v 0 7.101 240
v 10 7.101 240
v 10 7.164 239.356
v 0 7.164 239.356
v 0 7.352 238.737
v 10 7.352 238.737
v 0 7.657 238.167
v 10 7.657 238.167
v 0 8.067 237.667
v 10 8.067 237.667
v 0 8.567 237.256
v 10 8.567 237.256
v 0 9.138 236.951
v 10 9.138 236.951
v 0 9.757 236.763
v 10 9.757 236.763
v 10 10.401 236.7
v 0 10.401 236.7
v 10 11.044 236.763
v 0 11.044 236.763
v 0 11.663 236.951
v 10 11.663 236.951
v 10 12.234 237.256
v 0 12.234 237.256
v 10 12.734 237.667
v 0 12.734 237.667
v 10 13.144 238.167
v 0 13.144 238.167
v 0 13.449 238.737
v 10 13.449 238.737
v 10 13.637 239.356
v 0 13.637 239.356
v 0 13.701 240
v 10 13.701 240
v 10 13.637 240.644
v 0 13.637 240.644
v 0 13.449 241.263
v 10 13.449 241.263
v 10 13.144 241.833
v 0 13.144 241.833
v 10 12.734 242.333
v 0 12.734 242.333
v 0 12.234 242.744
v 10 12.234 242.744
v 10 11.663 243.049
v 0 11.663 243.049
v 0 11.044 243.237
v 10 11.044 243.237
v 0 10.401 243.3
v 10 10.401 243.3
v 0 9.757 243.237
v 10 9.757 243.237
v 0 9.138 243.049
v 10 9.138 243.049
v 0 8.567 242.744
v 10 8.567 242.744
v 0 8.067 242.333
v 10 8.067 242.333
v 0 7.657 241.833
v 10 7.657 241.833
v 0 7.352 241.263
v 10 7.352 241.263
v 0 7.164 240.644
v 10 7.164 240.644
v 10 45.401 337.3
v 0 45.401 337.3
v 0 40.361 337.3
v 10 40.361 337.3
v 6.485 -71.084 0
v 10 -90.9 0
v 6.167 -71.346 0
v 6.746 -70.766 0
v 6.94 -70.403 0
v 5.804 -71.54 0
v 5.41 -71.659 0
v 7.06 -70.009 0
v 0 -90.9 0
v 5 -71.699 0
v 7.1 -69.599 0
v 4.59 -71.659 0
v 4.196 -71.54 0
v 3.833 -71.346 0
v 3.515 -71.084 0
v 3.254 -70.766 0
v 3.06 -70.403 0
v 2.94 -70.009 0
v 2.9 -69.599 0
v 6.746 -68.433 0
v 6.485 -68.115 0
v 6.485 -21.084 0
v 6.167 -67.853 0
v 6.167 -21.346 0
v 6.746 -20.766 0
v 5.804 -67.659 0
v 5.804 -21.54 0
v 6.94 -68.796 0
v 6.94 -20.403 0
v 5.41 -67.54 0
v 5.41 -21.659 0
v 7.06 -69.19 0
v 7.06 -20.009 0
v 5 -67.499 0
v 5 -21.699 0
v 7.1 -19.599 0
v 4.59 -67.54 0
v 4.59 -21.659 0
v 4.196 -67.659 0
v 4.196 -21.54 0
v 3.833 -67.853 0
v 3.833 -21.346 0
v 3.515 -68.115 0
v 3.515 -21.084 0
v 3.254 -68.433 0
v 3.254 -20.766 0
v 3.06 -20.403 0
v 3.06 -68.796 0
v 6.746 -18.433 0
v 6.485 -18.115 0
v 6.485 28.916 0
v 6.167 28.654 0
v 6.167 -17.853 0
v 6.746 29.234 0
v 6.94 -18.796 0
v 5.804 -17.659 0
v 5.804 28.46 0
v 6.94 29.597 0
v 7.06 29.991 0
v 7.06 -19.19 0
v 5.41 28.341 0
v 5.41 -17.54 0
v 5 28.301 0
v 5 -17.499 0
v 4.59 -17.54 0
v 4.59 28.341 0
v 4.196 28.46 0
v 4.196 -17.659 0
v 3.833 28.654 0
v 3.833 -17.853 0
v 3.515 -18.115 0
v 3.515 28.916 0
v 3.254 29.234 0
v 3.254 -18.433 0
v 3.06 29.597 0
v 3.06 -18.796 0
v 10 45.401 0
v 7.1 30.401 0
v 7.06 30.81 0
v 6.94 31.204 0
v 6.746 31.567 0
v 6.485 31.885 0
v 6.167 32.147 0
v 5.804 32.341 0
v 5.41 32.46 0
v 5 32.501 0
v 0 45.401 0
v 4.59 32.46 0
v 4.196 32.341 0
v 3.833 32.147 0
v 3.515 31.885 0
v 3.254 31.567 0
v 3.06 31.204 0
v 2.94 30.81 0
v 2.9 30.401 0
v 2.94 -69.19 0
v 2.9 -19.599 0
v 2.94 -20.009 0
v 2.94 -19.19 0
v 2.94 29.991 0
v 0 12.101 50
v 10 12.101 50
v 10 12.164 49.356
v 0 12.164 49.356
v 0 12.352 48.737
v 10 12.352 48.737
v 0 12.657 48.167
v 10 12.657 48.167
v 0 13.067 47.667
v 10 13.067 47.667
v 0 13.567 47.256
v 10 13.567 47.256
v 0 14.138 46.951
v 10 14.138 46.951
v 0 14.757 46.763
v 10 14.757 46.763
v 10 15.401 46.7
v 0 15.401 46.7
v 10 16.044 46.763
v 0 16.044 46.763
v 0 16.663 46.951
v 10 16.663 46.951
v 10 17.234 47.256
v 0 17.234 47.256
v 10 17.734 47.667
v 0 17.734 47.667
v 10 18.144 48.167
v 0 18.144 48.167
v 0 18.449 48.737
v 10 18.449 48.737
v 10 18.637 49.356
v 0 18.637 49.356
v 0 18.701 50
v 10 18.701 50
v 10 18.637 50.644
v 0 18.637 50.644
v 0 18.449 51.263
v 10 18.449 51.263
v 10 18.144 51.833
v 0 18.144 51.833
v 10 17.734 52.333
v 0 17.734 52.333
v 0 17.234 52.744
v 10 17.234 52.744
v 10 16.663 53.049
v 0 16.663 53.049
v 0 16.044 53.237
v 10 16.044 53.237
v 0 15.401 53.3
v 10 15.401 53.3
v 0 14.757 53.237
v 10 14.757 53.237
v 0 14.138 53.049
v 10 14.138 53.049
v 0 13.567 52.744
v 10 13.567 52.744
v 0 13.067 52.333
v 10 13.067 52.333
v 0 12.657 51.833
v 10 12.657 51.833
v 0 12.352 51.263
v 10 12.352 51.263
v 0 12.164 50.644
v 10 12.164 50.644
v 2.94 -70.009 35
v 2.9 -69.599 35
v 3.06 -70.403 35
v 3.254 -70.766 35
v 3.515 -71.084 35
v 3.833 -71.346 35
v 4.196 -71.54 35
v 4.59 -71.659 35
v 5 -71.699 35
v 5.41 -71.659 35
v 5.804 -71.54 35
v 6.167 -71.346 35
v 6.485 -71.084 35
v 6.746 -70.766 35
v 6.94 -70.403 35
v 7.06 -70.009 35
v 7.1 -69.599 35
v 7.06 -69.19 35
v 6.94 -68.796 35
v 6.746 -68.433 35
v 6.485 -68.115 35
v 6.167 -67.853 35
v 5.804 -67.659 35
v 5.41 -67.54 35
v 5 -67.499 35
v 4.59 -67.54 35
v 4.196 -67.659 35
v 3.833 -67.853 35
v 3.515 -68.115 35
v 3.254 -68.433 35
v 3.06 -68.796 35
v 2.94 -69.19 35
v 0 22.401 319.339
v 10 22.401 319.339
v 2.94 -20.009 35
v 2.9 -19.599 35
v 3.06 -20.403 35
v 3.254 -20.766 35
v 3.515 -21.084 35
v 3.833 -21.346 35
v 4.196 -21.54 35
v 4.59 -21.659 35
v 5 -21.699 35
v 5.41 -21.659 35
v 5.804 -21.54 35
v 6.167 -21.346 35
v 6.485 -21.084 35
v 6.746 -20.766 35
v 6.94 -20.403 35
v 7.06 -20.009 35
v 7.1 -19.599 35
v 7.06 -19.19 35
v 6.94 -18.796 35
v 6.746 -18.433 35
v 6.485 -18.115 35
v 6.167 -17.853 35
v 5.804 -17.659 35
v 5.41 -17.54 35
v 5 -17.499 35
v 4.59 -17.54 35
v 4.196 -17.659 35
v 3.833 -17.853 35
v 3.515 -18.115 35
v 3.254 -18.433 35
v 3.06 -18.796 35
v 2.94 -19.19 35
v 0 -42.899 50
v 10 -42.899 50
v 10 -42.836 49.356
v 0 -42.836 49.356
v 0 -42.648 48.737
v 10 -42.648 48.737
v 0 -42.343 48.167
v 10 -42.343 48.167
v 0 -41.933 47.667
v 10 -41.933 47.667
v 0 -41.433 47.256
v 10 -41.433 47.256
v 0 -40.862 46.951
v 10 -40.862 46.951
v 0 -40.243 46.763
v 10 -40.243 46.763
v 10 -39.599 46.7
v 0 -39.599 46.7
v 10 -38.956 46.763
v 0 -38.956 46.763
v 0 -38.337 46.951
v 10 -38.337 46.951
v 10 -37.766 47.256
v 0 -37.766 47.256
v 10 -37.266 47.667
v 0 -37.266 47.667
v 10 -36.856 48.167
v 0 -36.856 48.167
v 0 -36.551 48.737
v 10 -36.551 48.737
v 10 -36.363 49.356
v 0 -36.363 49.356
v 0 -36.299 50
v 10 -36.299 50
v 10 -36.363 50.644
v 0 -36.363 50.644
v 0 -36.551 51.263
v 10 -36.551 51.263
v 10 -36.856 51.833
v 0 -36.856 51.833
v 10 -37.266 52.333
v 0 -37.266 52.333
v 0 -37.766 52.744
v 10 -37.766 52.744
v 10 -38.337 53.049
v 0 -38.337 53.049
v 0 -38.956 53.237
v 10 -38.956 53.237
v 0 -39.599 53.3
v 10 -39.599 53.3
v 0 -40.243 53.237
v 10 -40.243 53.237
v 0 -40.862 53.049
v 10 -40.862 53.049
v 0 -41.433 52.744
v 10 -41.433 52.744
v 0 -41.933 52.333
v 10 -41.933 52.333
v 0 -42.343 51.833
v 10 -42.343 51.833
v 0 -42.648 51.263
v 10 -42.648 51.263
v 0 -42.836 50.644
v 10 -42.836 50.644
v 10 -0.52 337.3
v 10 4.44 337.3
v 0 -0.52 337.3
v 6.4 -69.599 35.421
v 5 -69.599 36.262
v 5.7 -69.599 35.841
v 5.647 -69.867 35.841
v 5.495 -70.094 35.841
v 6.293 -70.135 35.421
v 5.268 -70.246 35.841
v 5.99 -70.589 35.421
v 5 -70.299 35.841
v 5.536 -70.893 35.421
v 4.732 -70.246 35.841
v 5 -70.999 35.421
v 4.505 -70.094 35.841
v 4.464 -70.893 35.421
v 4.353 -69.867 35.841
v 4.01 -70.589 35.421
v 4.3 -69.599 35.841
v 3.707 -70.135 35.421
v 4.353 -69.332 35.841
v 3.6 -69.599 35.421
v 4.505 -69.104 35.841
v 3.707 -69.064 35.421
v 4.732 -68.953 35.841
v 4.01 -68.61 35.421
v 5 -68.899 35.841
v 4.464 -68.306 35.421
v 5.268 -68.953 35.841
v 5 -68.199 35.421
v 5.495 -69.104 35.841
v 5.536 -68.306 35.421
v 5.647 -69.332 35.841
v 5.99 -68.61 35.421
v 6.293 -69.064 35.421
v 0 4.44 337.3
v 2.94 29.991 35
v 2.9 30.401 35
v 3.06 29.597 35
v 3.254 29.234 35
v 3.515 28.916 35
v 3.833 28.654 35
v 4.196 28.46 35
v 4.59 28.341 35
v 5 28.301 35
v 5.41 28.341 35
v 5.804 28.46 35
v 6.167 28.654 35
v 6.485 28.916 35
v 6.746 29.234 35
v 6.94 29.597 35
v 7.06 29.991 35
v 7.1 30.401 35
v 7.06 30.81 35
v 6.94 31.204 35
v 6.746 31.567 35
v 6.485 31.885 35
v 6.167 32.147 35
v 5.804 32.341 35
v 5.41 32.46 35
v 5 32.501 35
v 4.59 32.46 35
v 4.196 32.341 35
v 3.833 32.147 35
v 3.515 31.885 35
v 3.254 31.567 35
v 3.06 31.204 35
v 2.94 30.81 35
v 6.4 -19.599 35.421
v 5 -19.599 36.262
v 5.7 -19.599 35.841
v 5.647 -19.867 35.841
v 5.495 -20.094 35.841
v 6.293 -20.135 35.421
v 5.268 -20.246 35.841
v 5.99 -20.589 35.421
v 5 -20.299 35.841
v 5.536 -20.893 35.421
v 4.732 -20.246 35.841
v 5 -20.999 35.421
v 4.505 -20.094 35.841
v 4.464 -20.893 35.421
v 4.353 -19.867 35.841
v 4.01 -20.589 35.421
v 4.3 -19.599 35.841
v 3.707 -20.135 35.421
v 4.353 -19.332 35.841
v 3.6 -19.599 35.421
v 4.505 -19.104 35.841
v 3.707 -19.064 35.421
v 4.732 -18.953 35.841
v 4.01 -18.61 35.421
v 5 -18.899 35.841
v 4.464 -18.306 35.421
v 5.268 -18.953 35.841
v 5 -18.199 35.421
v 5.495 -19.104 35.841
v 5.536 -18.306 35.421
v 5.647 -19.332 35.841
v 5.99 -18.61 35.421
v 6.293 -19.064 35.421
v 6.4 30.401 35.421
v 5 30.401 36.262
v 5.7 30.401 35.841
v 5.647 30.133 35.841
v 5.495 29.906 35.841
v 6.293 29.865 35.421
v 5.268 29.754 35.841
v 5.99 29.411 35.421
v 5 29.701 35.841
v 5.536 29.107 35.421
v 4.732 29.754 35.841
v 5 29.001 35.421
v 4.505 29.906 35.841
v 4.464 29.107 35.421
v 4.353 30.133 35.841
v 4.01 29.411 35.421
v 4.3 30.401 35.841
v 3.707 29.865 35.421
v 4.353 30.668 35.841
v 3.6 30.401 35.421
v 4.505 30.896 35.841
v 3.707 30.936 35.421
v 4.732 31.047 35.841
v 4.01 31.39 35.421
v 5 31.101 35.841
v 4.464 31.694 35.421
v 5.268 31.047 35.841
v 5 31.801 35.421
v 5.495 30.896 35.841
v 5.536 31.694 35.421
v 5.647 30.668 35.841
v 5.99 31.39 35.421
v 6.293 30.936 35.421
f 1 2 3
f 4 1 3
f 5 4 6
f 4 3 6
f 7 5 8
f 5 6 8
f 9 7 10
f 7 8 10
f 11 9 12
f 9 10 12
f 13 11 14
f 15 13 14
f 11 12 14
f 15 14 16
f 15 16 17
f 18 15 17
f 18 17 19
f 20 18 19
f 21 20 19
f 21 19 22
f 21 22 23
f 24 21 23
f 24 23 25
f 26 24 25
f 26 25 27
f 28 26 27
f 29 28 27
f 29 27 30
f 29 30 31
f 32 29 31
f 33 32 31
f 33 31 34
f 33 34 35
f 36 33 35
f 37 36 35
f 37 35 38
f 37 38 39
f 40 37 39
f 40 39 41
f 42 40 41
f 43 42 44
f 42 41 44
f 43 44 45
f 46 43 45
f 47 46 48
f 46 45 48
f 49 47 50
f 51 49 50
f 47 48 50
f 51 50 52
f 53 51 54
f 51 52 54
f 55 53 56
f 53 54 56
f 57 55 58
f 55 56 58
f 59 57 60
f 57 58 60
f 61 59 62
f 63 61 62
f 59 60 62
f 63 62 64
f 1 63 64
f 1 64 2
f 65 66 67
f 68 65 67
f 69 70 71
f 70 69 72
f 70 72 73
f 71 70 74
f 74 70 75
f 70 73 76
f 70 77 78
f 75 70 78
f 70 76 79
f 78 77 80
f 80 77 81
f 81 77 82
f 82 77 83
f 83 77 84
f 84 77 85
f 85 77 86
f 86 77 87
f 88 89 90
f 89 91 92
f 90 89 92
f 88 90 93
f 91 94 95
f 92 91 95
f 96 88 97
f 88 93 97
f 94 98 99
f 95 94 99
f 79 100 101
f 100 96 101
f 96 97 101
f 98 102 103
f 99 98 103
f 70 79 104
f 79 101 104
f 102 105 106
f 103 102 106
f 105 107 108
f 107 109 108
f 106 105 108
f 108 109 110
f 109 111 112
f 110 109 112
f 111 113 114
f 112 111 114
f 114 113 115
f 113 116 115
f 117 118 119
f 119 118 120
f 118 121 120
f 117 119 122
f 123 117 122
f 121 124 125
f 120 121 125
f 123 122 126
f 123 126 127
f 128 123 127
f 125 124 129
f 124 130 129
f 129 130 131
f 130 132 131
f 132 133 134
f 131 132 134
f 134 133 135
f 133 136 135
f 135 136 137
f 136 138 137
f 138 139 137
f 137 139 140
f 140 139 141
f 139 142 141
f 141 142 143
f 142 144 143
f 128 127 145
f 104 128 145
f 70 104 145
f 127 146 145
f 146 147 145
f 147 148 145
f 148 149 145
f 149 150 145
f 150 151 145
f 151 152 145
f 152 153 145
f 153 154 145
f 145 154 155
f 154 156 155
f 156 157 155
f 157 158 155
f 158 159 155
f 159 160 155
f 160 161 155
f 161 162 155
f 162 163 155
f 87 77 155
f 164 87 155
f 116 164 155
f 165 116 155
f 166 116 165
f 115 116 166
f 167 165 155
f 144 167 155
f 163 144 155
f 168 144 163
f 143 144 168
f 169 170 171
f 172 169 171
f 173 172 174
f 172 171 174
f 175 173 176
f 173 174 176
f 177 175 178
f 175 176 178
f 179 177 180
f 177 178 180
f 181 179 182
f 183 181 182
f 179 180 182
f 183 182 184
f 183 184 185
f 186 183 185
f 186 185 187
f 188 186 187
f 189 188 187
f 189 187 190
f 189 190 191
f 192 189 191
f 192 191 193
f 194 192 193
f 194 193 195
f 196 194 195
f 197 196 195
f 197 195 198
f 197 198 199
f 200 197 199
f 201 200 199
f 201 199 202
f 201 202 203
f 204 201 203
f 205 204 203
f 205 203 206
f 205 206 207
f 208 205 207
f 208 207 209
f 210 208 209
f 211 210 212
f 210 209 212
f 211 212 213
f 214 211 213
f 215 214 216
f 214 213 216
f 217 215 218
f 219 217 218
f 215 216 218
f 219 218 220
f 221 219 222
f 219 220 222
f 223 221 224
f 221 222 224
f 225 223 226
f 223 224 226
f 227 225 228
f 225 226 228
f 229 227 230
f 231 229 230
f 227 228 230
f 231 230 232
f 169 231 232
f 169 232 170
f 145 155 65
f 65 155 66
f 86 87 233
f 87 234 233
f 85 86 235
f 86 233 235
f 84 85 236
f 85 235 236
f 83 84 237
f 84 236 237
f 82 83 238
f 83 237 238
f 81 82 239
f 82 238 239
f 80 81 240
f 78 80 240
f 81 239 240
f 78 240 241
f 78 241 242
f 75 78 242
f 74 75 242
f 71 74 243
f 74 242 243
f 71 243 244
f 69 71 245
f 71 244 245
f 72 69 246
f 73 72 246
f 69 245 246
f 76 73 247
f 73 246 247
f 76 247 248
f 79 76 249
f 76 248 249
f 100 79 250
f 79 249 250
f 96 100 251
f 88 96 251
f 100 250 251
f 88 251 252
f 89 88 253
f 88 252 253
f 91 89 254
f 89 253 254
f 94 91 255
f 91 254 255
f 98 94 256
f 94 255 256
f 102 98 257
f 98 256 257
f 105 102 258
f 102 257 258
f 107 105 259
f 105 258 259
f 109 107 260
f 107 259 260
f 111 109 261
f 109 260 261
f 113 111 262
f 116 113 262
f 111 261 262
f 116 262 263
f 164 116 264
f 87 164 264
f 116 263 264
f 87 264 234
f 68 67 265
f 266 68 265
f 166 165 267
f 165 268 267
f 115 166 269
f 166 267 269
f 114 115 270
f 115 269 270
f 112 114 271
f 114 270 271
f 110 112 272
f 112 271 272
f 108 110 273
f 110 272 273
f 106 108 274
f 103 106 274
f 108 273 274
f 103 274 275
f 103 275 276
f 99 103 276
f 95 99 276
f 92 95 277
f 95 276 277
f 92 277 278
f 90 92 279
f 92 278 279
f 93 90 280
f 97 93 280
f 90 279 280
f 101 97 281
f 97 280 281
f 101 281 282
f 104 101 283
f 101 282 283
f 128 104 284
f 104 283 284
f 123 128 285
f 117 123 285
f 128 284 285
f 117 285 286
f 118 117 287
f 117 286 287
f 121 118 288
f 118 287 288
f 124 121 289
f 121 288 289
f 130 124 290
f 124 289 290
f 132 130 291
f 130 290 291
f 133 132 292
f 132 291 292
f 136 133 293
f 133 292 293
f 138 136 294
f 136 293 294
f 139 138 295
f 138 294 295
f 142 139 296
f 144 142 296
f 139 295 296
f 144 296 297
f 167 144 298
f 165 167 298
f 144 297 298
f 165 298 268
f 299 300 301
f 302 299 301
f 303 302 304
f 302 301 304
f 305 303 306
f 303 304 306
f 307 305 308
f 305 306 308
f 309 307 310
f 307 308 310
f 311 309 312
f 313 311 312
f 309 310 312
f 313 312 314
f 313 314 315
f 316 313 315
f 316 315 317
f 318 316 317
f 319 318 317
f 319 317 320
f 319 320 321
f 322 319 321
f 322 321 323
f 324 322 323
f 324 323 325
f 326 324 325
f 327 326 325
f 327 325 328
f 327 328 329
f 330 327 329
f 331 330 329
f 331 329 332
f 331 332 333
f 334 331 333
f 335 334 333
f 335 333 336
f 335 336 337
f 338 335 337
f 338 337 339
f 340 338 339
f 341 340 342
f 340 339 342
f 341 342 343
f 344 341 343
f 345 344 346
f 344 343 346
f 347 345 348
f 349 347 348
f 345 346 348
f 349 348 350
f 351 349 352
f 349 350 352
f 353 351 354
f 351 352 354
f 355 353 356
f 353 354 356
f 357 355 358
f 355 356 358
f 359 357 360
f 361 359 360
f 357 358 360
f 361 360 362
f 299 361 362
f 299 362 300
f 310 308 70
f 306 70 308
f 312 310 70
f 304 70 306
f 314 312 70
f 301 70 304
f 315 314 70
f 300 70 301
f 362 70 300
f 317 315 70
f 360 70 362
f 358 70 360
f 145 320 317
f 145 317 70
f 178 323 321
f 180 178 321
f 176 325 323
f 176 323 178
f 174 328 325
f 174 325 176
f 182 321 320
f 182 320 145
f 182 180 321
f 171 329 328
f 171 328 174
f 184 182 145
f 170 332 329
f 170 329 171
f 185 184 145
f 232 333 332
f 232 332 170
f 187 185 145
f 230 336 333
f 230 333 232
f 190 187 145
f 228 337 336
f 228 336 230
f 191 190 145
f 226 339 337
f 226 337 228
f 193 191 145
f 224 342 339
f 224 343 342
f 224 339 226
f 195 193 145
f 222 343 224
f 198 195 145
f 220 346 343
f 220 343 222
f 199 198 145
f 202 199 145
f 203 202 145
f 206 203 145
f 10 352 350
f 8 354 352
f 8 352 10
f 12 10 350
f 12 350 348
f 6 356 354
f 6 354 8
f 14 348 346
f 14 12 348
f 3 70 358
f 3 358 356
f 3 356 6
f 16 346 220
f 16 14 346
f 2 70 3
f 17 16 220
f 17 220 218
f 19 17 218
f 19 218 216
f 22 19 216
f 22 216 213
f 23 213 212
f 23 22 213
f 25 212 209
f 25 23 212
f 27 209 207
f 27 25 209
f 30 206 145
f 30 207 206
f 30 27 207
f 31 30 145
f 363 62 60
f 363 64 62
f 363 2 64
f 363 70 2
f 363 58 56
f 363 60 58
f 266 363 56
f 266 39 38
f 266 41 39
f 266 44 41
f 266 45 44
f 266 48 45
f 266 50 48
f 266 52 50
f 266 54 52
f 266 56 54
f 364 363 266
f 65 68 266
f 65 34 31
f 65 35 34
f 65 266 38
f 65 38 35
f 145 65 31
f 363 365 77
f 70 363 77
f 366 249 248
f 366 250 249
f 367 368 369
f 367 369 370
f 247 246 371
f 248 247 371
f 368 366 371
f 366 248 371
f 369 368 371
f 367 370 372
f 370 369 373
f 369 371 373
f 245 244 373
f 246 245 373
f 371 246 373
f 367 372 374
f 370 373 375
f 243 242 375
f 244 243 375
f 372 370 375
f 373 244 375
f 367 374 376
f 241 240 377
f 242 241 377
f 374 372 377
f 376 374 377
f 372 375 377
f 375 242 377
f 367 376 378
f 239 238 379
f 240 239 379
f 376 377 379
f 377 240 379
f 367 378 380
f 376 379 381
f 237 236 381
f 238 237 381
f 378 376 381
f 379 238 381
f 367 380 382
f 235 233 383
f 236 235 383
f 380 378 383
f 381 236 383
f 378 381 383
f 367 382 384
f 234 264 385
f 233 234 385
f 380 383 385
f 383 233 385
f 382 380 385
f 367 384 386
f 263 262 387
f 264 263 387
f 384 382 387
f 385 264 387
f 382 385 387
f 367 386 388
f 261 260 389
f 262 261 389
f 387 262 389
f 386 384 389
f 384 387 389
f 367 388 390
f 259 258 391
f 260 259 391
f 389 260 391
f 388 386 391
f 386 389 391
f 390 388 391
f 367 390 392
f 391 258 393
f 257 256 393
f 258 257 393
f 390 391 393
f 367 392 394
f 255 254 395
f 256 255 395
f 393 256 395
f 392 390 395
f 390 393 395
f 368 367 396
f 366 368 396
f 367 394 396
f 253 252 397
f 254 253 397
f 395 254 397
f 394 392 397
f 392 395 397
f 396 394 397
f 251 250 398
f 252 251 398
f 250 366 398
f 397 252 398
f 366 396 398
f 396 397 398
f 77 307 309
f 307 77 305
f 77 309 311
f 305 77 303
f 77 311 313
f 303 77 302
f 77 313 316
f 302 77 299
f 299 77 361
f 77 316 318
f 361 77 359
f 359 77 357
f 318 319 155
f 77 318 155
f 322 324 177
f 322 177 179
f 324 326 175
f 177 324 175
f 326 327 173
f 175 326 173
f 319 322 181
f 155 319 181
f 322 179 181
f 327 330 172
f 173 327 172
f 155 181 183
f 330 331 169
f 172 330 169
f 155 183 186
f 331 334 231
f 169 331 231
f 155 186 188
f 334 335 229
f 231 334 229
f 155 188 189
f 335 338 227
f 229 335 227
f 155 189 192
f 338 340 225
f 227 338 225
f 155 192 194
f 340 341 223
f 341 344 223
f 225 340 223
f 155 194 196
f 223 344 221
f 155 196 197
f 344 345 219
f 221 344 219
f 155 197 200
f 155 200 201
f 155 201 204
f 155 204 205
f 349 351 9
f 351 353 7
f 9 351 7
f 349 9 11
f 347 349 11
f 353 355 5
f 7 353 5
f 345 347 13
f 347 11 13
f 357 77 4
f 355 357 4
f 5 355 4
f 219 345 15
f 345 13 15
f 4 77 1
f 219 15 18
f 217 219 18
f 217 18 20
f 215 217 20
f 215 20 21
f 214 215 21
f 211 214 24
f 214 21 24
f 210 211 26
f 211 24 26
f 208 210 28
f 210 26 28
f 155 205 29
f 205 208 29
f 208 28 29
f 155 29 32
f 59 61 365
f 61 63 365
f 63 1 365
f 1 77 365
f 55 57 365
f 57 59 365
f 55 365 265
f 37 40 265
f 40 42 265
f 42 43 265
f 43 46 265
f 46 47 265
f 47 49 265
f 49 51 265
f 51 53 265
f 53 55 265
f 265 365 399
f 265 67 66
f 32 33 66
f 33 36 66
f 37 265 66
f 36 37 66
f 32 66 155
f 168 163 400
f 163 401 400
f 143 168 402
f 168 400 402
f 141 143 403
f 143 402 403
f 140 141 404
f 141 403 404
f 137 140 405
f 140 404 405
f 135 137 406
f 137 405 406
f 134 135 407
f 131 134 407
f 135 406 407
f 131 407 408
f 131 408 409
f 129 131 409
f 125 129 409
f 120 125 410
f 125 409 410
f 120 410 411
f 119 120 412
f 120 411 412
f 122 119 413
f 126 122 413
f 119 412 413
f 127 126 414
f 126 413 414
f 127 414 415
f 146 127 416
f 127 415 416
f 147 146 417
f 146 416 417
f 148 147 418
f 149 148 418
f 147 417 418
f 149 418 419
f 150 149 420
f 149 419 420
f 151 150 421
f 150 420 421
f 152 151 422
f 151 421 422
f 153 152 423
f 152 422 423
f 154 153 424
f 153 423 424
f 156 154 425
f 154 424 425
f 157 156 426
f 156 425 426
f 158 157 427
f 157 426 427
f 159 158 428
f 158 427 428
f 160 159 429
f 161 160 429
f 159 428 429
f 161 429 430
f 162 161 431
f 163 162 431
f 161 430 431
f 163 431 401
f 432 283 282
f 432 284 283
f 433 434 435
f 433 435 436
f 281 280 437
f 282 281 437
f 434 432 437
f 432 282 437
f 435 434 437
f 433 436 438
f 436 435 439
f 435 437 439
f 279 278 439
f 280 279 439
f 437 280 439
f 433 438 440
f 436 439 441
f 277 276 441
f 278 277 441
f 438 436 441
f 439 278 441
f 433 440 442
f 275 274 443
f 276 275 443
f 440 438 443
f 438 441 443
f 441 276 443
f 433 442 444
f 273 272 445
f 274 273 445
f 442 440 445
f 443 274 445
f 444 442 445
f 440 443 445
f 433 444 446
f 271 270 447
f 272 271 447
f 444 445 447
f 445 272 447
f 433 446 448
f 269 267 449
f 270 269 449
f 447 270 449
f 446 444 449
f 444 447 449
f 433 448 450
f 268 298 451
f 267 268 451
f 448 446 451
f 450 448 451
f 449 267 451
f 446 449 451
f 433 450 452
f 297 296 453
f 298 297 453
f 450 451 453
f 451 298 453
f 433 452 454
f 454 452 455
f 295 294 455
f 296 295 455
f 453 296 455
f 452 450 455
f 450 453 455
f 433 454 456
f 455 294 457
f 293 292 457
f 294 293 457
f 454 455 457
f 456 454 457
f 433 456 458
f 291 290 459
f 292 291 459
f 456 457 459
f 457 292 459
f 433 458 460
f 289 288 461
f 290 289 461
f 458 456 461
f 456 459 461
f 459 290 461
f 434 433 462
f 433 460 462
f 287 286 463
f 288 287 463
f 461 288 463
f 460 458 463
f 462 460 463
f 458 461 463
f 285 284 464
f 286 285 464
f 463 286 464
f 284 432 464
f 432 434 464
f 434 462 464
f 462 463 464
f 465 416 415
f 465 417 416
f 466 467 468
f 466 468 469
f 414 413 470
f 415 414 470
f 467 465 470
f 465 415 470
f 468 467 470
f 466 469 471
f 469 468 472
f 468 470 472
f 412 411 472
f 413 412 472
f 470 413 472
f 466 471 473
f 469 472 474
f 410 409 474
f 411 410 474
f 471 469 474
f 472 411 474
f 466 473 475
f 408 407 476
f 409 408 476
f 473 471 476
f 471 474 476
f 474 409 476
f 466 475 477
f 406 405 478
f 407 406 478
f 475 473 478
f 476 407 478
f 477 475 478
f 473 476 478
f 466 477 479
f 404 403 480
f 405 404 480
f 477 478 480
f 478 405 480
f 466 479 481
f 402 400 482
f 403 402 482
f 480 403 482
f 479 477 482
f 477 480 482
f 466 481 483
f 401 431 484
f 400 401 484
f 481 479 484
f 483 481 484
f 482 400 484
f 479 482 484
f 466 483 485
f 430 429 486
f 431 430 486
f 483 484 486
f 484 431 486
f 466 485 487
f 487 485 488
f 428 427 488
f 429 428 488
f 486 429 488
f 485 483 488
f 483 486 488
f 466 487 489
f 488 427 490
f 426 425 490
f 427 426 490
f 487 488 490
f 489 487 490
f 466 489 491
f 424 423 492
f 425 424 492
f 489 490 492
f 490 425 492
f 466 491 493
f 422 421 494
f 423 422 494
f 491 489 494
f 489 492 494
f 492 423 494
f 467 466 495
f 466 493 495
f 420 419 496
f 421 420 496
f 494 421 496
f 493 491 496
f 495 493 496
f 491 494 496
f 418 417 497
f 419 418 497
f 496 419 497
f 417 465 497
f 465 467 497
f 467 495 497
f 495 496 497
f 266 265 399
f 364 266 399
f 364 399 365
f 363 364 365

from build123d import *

# Parameters (mm, degrees)
F1_DEPTH = 10
F4_D     = 6.6
F6_D     = 4.2
F6_DEPTH = 35
F6_TIP   = 1.2618073


with BuildPart() as f1:
    # F0 (on Right) → F1 (new body)
    with BuildSketch(Plane.YZ):
        Polygon((-0.5204892877, 337.3), (-90.8997518947, 0), (45.4005351965, 0), (45.4005351965, 337.3), (40.3610474387, 337.3), (22.4005351965, 319.3394877579), (4.4400229544, 337.3), align=None)
    extrude(amount=F1_DEPTH)

    # F4 (through all)
    with Locations(Plane(origin=(0, 0, 0), x_dir=(0, 1, 0), z_dir=(-1, 0, 0))):
        with Locations((10.4005351965, -240), (15.4005351965, -50), (-39.5994648035, -50)):
            Hole(F4_D / 2)

    # F6
    with Locations(Plane(origin=(0, 0, 0), x_dir=(1, 0, 0), z_dir=(0, 0, -1))):
        with Locations((5, 69.5994648035), (5, 19.5994648035), (5, -30.4005351965)):
            Hole(F6_D / 2, depth=F6_DEPTH)
            with Locations((0, 0, -(F6_DEPTH + F6_TIP / 2))):  # 118° drill point
                Cone(0, F6_D / 2, F6_TIP, mode=Mode.SUBTRACT)


solid = f1.part
